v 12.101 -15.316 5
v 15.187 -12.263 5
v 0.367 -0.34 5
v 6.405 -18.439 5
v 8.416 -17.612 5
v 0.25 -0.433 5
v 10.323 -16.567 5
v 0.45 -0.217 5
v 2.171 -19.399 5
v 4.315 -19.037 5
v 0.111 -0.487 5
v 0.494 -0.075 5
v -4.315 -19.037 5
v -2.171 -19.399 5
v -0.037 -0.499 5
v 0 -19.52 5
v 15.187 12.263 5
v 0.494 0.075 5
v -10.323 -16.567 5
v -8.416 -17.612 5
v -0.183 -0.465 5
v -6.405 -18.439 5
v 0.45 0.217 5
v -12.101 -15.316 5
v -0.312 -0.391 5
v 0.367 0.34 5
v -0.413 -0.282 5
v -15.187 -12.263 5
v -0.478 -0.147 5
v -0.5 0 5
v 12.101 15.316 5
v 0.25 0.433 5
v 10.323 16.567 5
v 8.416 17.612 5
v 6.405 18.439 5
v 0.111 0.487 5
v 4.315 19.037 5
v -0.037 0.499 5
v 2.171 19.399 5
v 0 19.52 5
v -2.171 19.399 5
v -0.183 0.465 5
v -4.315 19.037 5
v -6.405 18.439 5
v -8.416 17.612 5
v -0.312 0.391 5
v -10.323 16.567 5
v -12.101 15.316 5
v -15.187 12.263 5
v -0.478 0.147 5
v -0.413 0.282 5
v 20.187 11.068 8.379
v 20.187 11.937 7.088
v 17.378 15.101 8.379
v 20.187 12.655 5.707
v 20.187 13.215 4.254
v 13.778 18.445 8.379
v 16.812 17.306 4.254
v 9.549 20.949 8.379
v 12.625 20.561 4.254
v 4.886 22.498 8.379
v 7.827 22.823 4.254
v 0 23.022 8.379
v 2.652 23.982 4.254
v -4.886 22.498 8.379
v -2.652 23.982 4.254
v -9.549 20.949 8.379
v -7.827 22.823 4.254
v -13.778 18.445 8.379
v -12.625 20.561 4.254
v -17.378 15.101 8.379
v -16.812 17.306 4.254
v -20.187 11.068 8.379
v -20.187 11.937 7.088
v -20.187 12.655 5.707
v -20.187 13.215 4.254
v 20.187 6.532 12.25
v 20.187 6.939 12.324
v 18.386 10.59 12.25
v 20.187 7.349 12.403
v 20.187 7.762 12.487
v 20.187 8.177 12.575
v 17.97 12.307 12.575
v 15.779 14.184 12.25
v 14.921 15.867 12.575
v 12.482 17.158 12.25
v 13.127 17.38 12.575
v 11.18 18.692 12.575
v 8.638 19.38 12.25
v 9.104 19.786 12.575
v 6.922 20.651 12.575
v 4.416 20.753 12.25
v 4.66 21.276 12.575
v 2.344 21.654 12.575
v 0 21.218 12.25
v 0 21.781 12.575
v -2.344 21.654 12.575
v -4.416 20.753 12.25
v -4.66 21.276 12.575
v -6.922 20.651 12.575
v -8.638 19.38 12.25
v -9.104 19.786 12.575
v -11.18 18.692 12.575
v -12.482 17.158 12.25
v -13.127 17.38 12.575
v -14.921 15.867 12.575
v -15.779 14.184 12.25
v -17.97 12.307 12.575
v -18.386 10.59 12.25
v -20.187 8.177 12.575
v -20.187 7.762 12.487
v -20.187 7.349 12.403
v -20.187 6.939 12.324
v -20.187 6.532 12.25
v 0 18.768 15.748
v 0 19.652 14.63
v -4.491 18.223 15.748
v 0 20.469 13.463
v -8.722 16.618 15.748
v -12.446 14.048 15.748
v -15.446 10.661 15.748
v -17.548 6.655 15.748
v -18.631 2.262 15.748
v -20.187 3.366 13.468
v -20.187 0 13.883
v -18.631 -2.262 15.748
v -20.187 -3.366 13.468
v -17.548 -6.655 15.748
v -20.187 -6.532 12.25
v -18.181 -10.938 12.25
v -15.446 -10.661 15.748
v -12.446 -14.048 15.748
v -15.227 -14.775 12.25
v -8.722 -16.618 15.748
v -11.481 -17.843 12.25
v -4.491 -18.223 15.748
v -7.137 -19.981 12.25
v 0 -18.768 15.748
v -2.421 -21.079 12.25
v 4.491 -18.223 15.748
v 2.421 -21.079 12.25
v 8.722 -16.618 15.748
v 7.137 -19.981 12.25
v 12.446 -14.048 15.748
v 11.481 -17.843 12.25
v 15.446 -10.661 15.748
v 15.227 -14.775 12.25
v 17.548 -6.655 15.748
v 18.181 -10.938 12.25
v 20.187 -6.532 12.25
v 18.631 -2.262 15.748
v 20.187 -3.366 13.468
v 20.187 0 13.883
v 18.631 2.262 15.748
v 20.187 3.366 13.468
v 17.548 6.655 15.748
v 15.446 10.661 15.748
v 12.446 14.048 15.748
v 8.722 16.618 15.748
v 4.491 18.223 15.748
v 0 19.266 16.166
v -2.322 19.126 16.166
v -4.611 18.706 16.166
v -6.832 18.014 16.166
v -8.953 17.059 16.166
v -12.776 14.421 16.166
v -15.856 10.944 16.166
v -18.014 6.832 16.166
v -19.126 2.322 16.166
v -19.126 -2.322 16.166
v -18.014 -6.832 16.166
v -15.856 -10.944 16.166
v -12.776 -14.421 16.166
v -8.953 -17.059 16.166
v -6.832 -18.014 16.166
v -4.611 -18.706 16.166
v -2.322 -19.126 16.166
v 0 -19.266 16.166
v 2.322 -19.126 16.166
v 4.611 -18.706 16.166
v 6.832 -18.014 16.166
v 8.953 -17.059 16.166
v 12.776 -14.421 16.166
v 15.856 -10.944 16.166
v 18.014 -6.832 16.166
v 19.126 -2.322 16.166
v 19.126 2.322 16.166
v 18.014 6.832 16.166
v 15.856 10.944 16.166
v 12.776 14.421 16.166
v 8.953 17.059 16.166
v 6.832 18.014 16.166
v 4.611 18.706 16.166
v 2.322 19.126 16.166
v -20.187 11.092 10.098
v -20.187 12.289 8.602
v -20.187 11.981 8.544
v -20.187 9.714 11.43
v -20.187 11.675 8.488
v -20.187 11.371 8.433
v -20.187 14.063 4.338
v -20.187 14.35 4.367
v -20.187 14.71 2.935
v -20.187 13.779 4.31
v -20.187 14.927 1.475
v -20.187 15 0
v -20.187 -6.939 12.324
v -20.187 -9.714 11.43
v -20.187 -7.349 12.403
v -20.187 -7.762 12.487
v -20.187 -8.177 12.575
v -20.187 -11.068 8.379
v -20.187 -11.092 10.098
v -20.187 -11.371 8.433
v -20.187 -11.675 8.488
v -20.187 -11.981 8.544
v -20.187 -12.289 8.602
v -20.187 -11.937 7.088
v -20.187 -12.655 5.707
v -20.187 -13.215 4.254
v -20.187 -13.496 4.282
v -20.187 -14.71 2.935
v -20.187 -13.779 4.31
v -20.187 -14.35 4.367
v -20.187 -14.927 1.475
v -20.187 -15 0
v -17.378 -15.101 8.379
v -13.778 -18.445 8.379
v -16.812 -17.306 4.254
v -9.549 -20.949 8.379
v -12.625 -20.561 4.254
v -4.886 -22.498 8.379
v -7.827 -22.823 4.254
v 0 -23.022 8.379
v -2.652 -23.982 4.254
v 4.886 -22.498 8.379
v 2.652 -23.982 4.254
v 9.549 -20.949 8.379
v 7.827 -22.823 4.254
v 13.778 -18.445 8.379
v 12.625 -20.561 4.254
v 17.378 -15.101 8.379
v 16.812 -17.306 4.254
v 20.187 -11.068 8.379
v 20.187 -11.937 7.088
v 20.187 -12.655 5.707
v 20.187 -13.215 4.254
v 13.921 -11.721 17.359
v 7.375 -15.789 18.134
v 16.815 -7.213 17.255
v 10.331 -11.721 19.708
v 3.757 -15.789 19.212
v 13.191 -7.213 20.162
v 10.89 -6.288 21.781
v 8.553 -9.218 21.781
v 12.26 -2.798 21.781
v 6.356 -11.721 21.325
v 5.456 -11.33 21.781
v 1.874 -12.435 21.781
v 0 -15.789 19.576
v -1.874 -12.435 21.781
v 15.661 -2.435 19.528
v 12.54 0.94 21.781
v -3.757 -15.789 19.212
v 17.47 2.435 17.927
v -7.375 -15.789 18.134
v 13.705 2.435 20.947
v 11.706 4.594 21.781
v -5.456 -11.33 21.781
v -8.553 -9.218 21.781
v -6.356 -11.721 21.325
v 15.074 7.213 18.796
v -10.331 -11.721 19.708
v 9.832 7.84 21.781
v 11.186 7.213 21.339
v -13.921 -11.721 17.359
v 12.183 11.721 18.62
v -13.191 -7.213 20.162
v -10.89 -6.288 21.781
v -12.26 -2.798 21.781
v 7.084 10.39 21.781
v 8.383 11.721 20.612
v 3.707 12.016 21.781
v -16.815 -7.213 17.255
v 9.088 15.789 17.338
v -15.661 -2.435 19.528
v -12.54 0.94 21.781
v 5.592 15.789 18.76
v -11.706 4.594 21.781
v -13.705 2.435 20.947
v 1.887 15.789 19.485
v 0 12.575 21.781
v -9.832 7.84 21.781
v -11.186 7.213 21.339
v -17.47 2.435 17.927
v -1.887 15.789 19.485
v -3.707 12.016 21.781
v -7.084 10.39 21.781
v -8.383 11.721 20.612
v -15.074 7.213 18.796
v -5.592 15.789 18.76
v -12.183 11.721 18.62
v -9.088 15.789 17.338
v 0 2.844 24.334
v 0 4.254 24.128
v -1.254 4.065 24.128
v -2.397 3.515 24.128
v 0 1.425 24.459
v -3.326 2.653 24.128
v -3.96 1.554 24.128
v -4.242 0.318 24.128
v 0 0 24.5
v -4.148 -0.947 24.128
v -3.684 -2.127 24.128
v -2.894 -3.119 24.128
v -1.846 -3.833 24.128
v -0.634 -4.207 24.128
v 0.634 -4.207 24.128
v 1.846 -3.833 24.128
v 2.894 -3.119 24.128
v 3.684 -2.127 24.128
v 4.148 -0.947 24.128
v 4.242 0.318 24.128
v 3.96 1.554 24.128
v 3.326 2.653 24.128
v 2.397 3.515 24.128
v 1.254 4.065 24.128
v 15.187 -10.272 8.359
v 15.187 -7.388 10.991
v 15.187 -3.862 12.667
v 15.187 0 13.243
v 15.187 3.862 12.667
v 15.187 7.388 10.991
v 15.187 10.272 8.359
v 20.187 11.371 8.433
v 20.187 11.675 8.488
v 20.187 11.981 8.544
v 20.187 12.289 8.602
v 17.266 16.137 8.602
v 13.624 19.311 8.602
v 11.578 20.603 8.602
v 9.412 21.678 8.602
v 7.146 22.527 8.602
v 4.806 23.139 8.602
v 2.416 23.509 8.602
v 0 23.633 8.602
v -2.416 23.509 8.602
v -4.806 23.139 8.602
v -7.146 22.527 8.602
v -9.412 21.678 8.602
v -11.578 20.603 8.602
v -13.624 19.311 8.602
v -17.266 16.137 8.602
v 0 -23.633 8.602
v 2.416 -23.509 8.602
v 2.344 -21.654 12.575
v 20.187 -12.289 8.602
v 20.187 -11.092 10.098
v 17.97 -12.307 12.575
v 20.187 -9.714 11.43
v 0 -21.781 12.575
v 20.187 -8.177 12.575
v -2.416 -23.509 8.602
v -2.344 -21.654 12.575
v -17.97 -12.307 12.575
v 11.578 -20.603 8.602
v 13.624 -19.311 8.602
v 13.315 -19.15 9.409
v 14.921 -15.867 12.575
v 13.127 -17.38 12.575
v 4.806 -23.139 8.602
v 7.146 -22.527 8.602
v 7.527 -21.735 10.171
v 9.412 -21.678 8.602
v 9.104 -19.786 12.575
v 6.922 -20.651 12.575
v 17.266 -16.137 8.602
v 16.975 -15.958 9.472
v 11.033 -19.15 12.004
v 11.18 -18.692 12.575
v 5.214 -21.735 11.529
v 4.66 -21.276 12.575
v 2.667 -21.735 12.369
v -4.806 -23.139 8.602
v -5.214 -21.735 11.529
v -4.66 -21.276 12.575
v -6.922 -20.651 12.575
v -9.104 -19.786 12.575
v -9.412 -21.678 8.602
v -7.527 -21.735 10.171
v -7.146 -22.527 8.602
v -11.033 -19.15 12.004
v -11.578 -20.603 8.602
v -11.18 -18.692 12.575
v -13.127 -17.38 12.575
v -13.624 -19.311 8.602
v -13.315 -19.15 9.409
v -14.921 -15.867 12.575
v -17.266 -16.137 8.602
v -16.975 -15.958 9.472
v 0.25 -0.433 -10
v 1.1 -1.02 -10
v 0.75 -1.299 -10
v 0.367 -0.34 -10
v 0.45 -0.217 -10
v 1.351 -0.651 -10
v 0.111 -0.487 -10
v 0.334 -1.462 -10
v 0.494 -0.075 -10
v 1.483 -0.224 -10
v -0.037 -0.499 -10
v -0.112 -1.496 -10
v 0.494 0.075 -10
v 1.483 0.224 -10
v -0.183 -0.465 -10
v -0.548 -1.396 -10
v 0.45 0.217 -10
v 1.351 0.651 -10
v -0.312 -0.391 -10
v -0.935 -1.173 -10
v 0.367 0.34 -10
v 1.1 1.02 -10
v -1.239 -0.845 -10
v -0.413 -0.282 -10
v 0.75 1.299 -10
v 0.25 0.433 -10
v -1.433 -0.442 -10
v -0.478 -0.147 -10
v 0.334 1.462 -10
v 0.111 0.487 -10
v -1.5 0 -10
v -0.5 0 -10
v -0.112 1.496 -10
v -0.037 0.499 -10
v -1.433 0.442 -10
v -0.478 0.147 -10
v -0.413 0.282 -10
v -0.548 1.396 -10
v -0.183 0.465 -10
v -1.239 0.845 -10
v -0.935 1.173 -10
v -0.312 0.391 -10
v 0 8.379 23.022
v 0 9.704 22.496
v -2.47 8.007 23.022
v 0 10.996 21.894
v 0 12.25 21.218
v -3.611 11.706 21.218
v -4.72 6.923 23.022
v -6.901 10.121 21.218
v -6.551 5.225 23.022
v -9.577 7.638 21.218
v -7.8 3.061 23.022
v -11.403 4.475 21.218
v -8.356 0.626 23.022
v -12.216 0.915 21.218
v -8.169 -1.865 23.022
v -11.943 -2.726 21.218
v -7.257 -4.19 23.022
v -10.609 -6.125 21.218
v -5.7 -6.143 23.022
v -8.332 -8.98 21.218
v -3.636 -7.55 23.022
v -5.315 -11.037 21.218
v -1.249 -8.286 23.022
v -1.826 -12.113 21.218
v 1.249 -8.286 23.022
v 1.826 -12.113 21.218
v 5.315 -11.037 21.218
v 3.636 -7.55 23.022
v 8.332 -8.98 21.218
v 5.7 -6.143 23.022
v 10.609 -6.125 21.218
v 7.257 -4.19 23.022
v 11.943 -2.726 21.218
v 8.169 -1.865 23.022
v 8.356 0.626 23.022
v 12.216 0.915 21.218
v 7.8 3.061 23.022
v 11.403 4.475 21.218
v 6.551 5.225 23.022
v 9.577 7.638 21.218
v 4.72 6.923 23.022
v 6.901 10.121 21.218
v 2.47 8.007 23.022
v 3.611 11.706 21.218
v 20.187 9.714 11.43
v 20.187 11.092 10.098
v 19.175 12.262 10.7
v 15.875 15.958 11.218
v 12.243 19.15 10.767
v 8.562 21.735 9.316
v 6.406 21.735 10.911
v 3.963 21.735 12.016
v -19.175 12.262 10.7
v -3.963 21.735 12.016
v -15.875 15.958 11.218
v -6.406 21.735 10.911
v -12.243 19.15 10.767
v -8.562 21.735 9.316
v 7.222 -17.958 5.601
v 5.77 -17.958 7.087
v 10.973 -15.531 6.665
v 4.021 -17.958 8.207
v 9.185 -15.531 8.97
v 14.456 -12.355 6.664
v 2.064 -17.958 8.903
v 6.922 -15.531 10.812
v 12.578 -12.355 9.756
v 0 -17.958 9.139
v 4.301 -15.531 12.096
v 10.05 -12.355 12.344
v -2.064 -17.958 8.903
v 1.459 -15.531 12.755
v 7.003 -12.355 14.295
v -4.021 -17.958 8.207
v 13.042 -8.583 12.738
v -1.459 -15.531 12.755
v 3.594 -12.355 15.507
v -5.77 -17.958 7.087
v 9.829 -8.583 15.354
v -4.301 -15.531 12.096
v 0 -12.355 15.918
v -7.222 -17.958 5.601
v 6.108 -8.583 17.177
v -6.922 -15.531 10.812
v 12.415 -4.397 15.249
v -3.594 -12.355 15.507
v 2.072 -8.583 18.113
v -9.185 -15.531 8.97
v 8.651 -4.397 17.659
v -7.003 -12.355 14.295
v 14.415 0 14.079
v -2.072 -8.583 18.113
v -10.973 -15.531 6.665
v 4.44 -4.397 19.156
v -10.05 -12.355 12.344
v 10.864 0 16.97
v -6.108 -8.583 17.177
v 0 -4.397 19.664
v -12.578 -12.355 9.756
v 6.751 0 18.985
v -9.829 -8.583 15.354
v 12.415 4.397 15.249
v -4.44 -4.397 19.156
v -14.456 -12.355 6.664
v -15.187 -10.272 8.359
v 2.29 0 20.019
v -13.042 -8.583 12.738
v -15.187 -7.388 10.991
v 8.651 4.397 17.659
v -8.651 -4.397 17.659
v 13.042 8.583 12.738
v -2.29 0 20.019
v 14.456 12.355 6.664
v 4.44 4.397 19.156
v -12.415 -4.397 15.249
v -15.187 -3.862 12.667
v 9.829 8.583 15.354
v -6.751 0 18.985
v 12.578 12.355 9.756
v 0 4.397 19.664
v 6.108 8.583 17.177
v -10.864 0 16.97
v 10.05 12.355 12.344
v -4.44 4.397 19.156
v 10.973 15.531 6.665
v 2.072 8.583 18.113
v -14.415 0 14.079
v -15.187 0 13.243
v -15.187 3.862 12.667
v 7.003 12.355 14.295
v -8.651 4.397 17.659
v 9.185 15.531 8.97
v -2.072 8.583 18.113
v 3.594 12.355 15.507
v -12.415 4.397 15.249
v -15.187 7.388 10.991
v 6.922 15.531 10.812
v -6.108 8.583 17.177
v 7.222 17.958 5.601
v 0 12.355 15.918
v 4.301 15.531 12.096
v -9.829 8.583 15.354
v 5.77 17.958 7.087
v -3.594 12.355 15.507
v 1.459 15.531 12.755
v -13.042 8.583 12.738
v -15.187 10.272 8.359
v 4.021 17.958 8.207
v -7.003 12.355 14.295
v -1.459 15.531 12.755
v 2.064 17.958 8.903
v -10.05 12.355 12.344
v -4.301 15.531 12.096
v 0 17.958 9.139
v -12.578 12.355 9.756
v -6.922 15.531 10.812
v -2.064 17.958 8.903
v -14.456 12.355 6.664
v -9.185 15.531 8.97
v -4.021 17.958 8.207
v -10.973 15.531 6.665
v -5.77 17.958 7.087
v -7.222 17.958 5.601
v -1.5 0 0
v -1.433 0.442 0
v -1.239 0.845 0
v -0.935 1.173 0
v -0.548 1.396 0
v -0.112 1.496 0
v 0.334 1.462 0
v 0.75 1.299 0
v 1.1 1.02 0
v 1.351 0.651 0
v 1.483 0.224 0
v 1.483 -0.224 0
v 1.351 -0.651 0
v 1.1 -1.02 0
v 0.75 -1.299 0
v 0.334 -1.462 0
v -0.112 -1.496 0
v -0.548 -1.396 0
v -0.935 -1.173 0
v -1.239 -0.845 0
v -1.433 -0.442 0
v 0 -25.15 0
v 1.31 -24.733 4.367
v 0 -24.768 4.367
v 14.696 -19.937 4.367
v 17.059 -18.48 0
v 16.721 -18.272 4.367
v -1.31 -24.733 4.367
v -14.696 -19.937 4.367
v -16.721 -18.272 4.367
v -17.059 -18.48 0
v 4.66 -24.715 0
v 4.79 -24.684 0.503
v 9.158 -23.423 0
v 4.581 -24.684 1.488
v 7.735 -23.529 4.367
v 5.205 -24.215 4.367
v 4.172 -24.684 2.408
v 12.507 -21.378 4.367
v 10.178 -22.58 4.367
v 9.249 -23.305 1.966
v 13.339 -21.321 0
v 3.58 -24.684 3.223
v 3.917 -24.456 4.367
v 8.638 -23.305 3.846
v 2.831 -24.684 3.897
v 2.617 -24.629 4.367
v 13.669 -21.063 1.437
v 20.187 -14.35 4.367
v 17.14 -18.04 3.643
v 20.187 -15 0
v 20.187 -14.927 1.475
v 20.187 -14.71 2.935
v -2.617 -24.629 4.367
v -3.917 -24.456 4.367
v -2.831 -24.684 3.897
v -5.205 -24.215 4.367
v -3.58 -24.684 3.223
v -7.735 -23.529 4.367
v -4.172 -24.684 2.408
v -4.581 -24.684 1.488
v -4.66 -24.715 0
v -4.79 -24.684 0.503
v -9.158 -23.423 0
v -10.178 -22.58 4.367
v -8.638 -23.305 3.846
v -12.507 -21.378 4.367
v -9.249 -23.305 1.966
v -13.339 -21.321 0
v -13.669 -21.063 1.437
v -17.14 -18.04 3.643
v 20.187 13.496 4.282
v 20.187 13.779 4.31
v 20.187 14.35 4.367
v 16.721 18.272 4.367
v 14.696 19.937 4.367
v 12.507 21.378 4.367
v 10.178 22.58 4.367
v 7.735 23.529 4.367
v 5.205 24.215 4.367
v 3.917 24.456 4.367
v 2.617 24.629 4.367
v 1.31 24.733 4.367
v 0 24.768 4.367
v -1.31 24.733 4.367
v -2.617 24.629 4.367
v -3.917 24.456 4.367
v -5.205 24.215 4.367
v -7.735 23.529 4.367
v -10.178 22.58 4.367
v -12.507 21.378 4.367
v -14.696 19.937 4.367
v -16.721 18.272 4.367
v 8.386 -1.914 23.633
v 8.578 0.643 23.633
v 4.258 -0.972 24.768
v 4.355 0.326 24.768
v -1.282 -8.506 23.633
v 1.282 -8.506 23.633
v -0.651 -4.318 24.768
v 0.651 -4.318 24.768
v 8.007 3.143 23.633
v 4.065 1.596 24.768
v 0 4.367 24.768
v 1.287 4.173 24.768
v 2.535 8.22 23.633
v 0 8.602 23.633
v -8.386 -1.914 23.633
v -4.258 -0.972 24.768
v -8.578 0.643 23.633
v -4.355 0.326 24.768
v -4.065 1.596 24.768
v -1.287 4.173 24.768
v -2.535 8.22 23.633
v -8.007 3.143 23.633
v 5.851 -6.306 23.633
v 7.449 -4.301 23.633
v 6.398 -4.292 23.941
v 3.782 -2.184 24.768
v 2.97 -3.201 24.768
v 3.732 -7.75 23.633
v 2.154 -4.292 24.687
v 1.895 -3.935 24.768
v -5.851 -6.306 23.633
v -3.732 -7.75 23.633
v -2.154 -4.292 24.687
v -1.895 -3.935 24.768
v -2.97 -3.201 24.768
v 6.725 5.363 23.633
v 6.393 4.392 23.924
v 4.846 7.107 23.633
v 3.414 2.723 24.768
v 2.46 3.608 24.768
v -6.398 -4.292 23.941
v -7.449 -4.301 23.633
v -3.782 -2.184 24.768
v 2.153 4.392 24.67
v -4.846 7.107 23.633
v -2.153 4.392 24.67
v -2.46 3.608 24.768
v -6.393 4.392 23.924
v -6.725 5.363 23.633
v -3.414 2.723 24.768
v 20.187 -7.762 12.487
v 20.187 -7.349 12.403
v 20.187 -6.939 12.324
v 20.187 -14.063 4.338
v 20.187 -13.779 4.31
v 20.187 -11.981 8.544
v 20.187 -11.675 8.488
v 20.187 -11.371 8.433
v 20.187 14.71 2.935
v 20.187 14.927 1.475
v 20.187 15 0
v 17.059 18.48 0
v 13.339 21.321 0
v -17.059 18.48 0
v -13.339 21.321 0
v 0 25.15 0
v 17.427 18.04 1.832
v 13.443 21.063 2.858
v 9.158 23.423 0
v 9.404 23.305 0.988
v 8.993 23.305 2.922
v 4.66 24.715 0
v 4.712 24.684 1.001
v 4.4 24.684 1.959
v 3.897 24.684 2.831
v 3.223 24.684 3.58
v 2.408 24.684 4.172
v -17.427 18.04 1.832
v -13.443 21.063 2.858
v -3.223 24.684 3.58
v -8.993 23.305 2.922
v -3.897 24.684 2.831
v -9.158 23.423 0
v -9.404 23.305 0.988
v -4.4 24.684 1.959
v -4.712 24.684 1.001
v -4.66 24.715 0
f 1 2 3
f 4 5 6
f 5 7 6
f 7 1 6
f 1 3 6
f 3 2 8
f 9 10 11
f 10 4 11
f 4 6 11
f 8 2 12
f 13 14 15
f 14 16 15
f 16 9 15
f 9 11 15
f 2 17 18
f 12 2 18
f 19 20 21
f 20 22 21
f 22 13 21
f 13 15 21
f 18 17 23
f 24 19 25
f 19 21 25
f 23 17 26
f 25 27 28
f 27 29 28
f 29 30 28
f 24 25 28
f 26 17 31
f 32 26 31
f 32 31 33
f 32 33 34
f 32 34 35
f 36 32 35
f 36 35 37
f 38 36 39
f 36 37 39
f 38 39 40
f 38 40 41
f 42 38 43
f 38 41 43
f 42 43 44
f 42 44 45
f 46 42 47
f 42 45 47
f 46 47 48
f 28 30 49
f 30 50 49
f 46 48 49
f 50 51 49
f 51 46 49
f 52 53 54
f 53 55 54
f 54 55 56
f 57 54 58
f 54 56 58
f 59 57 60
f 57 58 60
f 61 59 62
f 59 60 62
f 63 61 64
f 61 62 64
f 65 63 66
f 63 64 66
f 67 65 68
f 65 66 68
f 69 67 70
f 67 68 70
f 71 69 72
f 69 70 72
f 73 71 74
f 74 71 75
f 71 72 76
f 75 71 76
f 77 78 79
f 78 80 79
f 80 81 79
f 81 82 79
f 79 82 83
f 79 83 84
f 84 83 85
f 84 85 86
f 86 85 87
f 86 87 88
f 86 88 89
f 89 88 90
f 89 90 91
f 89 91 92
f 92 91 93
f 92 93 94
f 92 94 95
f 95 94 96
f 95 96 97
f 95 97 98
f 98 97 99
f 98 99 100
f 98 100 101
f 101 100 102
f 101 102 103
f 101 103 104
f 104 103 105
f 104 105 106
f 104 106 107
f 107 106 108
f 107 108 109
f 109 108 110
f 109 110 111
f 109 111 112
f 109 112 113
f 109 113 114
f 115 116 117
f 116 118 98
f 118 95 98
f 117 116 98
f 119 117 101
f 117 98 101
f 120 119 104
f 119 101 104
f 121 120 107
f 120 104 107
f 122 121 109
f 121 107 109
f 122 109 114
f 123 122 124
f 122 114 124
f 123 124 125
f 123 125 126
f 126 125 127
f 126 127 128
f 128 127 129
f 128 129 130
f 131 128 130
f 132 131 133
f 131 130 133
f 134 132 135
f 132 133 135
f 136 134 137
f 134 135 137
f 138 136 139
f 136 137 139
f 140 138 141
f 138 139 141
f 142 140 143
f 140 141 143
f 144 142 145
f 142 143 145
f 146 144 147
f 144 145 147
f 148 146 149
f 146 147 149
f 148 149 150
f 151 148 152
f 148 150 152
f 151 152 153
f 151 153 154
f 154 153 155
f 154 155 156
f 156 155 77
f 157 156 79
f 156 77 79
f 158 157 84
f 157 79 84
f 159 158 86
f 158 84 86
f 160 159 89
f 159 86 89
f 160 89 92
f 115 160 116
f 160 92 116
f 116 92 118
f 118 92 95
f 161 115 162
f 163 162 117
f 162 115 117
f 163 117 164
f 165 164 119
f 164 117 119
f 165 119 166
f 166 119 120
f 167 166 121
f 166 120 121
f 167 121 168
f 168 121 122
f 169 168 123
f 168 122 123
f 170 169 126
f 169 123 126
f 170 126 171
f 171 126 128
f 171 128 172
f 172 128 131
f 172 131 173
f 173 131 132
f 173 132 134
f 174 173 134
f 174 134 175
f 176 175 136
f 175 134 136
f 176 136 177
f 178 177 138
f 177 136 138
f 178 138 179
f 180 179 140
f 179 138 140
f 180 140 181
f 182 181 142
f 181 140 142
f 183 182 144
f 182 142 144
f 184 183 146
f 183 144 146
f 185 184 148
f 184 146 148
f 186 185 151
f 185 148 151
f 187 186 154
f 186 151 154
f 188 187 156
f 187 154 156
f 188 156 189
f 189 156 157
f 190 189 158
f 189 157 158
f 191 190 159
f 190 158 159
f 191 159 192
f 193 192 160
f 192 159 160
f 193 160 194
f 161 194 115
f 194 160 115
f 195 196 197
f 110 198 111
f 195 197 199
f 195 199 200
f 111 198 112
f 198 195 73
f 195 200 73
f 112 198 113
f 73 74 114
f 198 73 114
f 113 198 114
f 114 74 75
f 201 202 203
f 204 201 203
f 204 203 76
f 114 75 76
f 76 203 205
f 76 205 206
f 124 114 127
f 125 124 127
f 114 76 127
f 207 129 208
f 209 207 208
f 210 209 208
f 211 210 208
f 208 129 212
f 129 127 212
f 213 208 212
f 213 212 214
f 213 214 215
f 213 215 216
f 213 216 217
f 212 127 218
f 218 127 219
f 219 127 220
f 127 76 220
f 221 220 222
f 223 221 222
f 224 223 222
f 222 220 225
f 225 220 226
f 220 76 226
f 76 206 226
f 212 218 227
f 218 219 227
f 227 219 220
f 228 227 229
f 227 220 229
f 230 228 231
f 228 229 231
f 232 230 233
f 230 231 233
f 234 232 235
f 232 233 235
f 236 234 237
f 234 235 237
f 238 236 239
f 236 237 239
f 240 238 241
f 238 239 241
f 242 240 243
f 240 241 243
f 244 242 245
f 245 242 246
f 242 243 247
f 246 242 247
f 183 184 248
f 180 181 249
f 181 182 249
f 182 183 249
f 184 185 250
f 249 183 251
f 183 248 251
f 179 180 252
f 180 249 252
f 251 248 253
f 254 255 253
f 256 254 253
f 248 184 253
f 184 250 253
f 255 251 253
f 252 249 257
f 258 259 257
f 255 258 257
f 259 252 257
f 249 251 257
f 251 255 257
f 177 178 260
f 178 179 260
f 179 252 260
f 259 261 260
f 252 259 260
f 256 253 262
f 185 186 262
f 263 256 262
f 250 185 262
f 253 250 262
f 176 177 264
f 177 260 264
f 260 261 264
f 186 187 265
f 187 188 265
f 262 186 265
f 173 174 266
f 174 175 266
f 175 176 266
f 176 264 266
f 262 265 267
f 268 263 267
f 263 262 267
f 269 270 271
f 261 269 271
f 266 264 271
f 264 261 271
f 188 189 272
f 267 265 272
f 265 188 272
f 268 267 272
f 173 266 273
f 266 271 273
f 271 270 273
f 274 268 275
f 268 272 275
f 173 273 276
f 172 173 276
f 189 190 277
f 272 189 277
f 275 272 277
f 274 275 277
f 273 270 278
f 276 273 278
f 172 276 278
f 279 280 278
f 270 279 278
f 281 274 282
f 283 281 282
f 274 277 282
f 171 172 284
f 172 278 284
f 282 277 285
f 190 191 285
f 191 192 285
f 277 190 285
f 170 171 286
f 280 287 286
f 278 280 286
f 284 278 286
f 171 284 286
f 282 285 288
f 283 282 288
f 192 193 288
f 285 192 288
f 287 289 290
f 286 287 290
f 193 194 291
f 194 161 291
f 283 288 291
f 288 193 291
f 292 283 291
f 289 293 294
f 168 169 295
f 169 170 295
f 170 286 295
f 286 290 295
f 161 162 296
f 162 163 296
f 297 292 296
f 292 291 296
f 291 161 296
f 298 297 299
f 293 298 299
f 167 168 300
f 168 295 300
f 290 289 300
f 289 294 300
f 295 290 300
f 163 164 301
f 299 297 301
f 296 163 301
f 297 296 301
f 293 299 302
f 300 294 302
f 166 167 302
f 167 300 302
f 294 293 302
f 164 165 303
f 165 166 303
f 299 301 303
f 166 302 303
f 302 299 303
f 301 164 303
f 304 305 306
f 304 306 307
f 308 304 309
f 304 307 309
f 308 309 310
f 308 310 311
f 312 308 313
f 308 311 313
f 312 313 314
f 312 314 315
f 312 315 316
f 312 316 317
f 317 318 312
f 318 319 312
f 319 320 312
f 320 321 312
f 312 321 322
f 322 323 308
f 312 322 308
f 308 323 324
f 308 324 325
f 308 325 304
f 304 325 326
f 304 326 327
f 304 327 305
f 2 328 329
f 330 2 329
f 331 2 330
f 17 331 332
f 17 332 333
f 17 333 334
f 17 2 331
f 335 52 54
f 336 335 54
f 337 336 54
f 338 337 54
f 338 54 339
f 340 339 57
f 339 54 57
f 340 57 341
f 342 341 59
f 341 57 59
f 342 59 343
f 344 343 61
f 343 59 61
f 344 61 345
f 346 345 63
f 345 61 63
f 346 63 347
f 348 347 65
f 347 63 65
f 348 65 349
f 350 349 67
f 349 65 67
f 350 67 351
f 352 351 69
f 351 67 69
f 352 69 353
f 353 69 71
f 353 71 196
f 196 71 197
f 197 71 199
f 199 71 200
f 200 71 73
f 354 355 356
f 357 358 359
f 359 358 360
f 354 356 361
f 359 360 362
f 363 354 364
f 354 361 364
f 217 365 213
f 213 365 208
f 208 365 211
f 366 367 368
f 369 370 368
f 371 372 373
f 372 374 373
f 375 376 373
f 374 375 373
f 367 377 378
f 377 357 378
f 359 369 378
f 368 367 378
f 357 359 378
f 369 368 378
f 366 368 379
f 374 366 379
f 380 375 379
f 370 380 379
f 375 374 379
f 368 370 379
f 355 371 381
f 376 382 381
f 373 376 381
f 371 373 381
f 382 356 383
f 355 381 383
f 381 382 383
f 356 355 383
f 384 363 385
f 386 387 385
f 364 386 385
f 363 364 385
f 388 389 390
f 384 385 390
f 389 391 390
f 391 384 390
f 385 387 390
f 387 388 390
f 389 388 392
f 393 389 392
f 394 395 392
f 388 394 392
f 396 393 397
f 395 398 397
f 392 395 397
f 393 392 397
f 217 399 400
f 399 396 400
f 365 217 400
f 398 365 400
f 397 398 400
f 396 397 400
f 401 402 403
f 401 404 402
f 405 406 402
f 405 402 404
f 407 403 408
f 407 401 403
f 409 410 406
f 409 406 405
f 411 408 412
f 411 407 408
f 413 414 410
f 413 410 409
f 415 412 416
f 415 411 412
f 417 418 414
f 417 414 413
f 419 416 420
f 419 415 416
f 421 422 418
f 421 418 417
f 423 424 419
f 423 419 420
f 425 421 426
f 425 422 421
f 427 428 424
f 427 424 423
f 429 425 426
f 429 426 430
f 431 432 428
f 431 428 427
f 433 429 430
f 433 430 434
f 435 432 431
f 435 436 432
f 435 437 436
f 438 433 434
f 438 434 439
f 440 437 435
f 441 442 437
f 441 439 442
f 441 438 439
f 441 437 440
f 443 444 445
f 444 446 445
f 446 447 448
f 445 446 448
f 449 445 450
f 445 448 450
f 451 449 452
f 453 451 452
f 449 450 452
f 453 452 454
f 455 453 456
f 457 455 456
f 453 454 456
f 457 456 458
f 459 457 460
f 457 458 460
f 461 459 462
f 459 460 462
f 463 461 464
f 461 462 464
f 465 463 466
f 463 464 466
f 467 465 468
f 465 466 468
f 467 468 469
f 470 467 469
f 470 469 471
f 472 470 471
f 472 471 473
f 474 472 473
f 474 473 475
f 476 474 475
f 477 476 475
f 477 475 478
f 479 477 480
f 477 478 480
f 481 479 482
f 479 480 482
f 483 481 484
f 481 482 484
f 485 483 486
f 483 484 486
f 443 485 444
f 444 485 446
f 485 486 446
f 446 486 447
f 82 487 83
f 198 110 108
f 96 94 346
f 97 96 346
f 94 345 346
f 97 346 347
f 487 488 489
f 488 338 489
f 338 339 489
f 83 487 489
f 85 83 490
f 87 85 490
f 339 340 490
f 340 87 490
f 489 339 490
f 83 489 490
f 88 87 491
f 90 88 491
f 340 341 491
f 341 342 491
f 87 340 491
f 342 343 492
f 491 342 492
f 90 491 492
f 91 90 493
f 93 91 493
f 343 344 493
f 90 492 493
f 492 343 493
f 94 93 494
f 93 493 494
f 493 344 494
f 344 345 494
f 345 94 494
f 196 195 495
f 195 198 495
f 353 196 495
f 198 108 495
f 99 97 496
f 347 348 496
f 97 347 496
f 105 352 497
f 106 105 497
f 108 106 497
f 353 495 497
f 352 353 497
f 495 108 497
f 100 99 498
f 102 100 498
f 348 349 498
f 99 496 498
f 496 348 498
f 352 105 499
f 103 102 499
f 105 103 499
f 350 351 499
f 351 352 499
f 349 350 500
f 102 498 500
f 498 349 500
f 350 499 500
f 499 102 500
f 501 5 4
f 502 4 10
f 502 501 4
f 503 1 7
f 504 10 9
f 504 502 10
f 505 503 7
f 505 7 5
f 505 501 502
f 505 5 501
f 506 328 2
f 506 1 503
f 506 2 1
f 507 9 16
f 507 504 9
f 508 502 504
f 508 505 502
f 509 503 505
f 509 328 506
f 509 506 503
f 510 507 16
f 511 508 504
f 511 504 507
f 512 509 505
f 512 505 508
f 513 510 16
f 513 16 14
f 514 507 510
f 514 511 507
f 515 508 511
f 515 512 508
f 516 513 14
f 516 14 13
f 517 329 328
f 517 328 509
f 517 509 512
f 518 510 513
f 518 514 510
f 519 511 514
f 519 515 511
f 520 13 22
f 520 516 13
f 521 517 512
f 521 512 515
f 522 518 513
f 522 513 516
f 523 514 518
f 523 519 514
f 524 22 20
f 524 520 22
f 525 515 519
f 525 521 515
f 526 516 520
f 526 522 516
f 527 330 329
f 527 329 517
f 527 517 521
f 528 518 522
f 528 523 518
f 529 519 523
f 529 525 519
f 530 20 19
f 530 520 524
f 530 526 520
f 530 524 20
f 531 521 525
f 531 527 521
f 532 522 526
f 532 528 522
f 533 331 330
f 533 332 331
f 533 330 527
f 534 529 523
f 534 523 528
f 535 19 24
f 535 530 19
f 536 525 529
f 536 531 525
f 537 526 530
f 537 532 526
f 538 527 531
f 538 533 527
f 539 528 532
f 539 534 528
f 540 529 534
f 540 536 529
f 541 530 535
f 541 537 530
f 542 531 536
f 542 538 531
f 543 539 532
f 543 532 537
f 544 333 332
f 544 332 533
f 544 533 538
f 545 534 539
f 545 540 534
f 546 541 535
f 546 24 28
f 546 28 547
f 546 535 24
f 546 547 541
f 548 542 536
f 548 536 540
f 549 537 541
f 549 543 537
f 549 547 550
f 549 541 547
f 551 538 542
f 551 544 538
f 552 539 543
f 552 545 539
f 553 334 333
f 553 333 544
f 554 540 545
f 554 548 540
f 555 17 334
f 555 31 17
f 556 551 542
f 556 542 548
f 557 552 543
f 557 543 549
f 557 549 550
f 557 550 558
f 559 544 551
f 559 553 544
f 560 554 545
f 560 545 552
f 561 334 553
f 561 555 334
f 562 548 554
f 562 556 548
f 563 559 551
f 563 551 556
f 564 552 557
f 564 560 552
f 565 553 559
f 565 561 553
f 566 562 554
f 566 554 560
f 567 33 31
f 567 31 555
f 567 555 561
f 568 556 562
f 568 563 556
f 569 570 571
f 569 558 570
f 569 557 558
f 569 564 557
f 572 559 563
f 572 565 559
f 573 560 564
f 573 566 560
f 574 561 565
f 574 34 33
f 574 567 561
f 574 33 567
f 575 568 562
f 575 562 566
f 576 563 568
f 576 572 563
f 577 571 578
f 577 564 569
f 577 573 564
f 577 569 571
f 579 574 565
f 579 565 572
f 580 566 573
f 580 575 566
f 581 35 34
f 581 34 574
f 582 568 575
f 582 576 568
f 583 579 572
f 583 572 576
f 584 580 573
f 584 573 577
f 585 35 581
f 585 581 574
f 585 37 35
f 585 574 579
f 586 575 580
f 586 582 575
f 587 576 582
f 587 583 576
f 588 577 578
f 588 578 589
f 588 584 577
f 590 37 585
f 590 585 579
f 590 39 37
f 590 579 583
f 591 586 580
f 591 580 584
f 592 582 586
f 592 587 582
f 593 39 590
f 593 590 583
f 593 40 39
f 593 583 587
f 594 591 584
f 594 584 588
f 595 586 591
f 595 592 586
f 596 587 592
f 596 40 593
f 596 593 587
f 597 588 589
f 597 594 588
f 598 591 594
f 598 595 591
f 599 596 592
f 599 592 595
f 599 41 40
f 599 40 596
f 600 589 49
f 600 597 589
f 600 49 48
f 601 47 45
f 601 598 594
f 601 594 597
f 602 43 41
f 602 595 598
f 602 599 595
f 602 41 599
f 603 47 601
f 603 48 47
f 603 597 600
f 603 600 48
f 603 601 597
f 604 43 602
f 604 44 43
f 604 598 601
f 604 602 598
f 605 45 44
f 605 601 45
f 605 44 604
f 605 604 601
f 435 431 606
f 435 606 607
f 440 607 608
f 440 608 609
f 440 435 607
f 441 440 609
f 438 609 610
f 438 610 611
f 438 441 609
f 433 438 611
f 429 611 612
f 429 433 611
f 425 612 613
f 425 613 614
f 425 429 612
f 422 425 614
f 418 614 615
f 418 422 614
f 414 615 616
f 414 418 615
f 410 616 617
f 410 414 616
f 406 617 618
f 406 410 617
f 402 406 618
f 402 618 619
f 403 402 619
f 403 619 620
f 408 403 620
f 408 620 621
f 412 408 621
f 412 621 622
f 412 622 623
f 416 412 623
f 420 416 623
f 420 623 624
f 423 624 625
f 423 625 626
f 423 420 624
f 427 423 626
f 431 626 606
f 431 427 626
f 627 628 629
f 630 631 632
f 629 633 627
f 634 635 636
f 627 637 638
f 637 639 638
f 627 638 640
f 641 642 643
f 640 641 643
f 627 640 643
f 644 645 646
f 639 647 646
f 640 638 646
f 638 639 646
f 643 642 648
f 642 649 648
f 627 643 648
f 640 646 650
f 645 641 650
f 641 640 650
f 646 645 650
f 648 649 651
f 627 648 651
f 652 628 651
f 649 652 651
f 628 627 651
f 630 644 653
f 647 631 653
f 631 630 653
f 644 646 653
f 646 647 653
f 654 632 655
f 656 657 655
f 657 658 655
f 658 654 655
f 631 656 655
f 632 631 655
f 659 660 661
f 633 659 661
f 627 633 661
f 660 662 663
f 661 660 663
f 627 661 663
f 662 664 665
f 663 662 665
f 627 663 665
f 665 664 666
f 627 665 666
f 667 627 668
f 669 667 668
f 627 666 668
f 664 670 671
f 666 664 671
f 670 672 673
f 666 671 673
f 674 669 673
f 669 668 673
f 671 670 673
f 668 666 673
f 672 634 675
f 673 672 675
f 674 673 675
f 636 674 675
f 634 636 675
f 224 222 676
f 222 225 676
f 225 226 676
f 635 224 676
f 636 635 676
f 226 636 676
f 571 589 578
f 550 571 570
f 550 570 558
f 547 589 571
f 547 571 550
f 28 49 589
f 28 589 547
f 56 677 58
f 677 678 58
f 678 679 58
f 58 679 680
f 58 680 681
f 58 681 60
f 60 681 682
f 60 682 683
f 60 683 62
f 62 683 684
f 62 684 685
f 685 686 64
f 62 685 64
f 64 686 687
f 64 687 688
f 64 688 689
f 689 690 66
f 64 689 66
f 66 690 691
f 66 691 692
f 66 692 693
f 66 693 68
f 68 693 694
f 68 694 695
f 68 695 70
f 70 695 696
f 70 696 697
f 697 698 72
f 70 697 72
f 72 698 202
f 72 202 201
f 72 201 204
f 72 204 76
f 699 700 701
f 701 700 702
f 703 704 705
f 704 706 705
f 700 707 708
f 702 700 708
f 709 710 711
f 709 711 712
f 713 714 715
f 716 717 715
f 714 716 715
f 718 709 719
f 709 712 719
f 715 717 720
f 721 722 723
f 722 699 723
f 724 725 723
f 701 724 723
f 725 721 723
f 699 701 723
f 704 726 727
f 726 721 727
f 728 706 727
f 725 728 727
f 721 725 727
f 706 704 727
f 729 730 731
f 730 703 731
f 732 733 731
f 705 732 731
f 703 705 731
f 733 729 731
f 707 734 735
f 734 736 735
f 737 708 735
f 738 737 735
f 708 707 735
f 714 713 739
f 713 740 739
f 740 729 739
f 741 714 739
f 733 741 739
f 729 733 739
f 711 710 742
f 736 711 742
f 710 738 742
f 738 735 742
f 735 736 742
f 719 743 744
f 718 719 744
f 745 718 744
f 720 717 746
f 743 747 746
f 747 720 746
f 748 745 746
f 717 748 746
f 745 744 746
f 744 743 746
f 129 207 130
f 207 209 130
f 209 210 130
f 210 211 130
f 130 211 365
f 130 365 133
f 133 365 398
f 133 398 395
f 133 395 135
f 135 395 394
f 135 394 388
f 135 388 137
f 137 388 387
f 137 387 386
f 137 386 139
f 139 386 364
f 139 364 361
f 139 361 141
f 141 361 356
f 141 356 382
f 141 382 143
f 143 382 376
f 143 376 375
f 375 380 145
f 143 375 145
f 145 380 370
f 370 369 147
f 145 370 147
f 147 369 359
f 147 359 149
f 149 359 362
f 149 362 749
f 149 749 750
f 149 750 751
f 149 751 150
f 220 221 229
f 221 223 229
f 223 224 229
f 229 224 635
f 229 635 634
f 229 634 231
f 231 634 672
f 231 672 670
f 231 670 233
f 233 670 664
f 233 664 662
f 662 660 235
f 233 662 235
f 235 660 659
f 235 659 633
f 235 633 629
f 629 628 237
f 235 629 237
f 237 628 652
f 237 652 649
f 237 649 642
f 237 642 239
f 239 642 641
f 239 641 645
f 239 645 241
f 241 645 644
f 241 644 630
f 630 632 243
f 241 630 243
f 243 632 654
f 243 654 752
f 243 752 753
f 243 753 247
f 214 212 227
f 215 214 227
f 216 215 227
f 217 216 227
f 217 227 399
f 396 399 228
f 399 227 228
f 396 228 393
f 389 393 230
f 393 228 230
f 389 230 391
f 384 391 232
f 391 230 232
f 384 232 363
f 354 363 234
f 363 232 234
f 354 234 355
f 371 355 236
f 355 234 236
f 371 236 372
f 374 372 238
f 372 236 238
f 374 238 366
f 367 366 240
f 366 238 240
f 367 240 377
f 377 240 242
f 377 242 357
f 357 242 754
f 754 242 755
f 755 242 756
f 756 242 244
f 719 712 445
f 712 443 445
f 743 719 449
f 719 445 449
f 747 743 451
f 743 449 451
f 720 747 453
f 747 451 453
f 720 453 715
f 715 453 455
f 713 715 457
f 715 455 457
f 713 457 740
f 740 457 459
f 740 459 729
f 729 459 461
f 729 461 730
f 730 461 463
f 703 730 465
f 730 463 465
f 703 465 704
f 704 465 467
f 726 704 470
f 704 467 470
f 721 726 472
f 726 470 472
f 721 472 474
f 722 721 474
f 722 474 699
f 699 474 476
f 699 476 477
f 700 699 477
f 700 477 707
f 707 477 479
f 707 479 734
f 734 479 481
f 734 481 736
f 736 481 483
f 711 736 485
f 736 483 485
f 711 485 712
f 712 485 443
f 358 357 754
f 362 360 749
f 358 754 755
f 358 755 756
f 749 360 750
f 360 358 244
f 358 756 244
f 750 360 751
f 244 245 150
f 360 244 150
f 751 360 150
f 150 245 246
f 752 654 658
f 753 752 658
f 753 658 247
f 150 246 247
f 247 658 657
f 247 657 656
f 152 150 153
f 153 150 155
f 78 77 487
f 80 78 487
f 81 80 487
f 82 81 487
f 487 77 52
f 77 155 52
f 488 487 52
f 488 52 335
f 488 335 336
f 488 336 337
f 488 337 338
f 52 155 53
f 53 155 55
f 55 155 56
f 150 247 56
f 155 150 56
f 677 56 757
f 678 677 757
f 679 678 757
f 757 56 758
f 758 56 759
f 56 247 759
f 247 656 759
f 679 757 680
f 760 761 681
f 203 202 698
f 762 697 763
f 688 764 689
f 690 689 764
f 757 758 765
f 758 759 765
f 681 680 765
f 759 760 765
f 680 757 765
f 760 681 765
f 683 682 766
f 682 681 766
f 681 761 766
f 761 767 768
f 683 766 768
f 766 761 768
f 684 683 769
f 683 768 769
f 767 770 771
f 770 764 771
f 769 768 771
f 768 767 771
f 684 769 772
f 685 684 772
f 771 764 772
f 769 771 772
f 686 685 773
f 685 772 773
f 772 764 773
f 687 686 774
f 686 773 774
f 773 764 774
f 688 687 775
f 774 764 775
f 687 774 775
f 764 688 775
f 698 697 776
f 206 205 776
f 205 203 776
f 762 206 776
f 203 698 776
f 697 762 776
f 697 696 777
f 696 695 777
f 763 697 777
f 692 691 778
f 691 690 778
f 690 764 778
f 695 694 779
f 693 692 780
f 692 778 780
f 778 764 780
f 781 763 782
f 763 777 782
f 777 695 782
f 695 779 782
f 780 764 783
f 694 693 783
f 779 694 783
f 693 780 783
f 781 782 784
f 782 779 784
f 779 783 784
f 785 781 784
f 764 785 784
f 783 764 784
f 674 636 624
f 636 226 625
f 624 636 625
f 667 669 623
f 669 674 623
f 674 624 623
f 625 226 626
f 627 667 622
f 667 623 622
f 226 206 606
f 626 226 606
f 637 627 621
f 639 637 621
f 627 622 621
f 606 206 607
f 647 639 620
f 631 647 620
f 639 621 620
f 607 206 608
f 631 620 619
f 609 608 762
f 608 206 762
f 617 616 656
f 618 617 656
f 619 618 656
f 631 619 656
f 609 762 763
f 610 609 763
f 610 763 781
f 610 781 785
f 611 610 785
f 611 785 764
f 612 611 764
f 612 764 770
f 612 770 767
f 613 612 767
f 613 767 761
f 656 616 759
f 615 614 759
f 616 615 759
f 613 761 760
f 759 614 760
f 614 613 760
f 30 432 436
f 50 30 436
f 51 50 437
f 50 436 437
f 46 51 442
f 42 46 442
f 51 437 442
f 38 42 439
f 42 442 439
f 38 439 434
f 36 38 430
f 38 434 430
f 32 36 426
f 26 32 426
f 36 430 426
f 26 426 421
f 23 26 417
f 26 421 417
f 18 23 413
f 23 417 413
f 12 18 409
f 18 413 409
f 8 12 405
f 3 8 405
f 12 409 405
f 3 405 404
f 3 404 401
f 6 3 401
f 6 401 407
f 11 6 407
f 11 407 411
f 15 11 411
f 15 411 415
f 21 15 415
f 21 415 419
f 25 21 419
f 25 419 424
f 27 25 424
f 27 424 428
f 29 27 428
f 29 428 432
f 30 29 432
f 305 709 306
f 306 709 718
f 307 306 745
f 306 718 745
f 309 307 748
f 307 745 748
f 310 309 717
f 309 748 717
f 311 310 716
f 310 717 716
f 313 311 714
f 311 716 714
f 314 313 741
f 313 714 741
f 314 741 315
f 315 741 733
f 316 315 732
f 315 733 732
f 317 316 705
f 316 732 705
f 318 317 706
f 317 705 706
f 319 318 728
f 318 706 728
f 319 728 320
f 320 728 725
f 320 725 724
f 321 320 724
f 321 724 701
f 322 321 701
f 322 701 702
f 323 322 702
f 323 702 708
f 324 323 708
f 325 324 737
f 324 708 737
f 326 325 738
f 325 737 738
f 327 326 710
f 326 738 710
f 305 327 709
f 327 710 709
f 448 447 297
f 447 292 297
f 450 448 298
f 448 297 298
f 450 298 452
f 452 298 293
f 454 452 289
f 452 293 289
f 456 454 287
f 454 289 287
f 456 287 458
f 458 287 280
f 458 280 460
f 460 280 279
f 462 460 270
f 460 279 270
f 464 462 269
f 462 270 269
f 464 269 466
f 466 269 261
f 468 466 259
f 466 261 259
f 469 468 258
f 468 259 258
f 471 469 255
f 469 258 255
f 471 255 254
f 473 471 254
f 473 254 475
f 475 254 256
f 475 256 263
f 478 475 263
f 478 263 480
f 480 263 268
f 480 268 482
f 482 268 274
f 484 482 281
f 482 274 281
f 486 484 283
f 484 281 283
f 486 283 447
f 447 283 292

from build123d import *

# Parameters (mm, degrees)
REVOLVE_1_ANGLE     = 180
CUT_EXTRUDE_1_DEPTH = 44.56107781
SHELL_1_T           = -5
SKETCH_3_R          = 1.5
SKETCH_3_R_2        = 0.5
EXTRUDE_3_DEPTH     = 5
EXTRUDE_START       = 10
SKETCH_5_R          = 1.5
SKETCH_5_R_2        = 0.5
EXTRUDE_4_DEPTH     = 10


with BuildPart() as part:
    # 草图1 → 旋转1 (revolve)
    with BuildSketch(Plane.XY):
        with BuildLine():
            Line((0, 25.15), (0, -25.15))
            ThreePointArc((0, -25.15), (25.15, 0), (0, 25.15))
        make_face()
    revolve(axis=Axis((0, 25.15, 0), (0, -1, 0)), revolution_arc=REVOLVE_1_ANGLE)

    # 草图2 → 切除-拉伸1 (cut, through all)
    with BuildSketch(Plane(origin=(0, 0, 0), x_dir=(-1, 0, 0), z_dir=(0, 0, -1))):
        with BuildLine():
            ThreePointArc((25.15, 0), (23.877083587, 7.899834137), (20.18718653, 15))
            Line((20.18718653, 15), (20.18718653, -15))
            ThreePointArc((20.18718653, -15), (23.877083587, -7.899834137), (25.15, 0))
        make_face()
        with BuildLine():
            Line((-20.18718653, -15), (-20.18718653, 15))
            ThreePointArc((-20.18718653, 15), (-25.15, 0), (-20.18718653, -15))
        make_face()
    extrude(amount=-CUT_EXTRUDE_1_DEPTH, mode=Mode.SUBTRACT)

    # 抽壳1
    shell_1_openings = [part.faces().sort_by_distance(p)[0] for p in [
        (0, 0, 0),
    ]]
    offset(amount=SHELL_1_T, openings=shell_1_openings)

    # 草图3 → 凸台-拉伸3 (add)
    # profile 1 of 2: a face of its own
    with BuildSketch(Plane(origin=(0, 0, 0), x_dir=(-1, 0, 0), z_dir=(0, 0, -1))):
        with BuildLine():
            ThreePointArc((-15.18718653, 13.242804284), (0, 20.15), (15.18718653, 13.242804284))
            Line((15.18718653, 13.242804284), (15.18718653, -13.242804284))
            ThreePointArc((15.18718653, -13.242804284), (0, -20.15), (-15.18718653, -13.242804284))
            Line((-15.18718653, -13.242804284), (-15.18718653, 13.242804284))
        make_face()
        Circle(SKETCH_3_R, mode=Mode.SUBTRACT)
    # profile 2 of 2: a face of its own
    with BuildSketch(Plane(origin=(0, 0, 0), x_dir=(-1, 0, 0), z_dir=(0, 0, -1))):
        Circle(SKETCH_3_R)
        Circle(SKETCH_3_R_2, mode=Mode.SUBTRACT)
    extrude(amount=-EXTRUDE_3_DEPTH)

    # 草图5 → 凸台-拉伸4 (add)
    with BuildSketch(Plane(origin=(0, 0, 0), x_dir=(-1, 0, 0), z_dir=(0, 0, -1)).offset(EXTRUDE_START)):
        Circle(SKETCH_5_R)
        Circle(SKETCH_5_R_2, mode=Mode.SUBTRACT)
    extrude(amount=-EXTRUDE_4_DEPTH)

    # 草图6 → 切除-旋转2 (revolve, cut)
    with BuildSketch(Plane(origin=(0, 0, 0), x_dir=(0, 0, -1), z_dir=(1, 0, 0))):
        with BuildLine():
            ThreePointArc((-8.379493511, 23.022469209), (-6.341066605, 23.665182744), (-4.254380353, 24.127789949))
            Line((-4.254380353, 24.127789949), (-4.367251668, 24.767914988))
            ThreePointArc((-4.367251668, 24.767914988), (-6.509298984, 24.293034531), (-8.601806605, 23.633269413))
            Line((-8.601806605, 23.633269413), (-8.379493511, 23.022469209))
        make_face()
        with BuildLine():
            ThreePointArc((-15.748296437, 18.768088856), (-14.052622691, 20.069225085), (-12.25, 21.217622393))
            Line((-12.25, 21.217622393), (-12.575, 21.780538905))
            ThreePointArc((-12.575, 21.780538905), (-14.425447374, 20.601673914), (-16.166108384, 19.266017744))
            Line((-16.166108384, 19.266017744), (-15.748296437, 18.768088856))
        make_face()
        with BuildLine():
            ThreePointArc((-23.022469209, 8.379493511), (-22.204540782, 10.354147413), (-21.217622393, 12.25))
            Line((-21.217622393, 12.25), (-21.780538905, 12.575))
            ThreePointArc((-21.780538905, 12.575), (-22.793640844, 10.628849283), (-23.633269413, 8.601806605))
            Line((-23.633269413, 8.601806605), (-23.022469209, 8.379493511))
        make_face()
        with BuildLine():
            Line((-25.15, 0), (-24.5, 0))
            ThreePointArc((-24.5, 0), (-24.406770103, 2.135315697), (-24.127789949, 4.254380353))
            Line((-24.127789949, 4.254380353), (-24.767914988, 4.367251668))
            ThreePointArc((-24.767914988, 4.367251668), (-25.054296657, 2.19196693), (-25.15, 0))
        make_face()
    revolve(axis=Axis((0, 0, 0), (0, 0, 1)), mode=Mode.SUBTRACT)


solid = part.part
